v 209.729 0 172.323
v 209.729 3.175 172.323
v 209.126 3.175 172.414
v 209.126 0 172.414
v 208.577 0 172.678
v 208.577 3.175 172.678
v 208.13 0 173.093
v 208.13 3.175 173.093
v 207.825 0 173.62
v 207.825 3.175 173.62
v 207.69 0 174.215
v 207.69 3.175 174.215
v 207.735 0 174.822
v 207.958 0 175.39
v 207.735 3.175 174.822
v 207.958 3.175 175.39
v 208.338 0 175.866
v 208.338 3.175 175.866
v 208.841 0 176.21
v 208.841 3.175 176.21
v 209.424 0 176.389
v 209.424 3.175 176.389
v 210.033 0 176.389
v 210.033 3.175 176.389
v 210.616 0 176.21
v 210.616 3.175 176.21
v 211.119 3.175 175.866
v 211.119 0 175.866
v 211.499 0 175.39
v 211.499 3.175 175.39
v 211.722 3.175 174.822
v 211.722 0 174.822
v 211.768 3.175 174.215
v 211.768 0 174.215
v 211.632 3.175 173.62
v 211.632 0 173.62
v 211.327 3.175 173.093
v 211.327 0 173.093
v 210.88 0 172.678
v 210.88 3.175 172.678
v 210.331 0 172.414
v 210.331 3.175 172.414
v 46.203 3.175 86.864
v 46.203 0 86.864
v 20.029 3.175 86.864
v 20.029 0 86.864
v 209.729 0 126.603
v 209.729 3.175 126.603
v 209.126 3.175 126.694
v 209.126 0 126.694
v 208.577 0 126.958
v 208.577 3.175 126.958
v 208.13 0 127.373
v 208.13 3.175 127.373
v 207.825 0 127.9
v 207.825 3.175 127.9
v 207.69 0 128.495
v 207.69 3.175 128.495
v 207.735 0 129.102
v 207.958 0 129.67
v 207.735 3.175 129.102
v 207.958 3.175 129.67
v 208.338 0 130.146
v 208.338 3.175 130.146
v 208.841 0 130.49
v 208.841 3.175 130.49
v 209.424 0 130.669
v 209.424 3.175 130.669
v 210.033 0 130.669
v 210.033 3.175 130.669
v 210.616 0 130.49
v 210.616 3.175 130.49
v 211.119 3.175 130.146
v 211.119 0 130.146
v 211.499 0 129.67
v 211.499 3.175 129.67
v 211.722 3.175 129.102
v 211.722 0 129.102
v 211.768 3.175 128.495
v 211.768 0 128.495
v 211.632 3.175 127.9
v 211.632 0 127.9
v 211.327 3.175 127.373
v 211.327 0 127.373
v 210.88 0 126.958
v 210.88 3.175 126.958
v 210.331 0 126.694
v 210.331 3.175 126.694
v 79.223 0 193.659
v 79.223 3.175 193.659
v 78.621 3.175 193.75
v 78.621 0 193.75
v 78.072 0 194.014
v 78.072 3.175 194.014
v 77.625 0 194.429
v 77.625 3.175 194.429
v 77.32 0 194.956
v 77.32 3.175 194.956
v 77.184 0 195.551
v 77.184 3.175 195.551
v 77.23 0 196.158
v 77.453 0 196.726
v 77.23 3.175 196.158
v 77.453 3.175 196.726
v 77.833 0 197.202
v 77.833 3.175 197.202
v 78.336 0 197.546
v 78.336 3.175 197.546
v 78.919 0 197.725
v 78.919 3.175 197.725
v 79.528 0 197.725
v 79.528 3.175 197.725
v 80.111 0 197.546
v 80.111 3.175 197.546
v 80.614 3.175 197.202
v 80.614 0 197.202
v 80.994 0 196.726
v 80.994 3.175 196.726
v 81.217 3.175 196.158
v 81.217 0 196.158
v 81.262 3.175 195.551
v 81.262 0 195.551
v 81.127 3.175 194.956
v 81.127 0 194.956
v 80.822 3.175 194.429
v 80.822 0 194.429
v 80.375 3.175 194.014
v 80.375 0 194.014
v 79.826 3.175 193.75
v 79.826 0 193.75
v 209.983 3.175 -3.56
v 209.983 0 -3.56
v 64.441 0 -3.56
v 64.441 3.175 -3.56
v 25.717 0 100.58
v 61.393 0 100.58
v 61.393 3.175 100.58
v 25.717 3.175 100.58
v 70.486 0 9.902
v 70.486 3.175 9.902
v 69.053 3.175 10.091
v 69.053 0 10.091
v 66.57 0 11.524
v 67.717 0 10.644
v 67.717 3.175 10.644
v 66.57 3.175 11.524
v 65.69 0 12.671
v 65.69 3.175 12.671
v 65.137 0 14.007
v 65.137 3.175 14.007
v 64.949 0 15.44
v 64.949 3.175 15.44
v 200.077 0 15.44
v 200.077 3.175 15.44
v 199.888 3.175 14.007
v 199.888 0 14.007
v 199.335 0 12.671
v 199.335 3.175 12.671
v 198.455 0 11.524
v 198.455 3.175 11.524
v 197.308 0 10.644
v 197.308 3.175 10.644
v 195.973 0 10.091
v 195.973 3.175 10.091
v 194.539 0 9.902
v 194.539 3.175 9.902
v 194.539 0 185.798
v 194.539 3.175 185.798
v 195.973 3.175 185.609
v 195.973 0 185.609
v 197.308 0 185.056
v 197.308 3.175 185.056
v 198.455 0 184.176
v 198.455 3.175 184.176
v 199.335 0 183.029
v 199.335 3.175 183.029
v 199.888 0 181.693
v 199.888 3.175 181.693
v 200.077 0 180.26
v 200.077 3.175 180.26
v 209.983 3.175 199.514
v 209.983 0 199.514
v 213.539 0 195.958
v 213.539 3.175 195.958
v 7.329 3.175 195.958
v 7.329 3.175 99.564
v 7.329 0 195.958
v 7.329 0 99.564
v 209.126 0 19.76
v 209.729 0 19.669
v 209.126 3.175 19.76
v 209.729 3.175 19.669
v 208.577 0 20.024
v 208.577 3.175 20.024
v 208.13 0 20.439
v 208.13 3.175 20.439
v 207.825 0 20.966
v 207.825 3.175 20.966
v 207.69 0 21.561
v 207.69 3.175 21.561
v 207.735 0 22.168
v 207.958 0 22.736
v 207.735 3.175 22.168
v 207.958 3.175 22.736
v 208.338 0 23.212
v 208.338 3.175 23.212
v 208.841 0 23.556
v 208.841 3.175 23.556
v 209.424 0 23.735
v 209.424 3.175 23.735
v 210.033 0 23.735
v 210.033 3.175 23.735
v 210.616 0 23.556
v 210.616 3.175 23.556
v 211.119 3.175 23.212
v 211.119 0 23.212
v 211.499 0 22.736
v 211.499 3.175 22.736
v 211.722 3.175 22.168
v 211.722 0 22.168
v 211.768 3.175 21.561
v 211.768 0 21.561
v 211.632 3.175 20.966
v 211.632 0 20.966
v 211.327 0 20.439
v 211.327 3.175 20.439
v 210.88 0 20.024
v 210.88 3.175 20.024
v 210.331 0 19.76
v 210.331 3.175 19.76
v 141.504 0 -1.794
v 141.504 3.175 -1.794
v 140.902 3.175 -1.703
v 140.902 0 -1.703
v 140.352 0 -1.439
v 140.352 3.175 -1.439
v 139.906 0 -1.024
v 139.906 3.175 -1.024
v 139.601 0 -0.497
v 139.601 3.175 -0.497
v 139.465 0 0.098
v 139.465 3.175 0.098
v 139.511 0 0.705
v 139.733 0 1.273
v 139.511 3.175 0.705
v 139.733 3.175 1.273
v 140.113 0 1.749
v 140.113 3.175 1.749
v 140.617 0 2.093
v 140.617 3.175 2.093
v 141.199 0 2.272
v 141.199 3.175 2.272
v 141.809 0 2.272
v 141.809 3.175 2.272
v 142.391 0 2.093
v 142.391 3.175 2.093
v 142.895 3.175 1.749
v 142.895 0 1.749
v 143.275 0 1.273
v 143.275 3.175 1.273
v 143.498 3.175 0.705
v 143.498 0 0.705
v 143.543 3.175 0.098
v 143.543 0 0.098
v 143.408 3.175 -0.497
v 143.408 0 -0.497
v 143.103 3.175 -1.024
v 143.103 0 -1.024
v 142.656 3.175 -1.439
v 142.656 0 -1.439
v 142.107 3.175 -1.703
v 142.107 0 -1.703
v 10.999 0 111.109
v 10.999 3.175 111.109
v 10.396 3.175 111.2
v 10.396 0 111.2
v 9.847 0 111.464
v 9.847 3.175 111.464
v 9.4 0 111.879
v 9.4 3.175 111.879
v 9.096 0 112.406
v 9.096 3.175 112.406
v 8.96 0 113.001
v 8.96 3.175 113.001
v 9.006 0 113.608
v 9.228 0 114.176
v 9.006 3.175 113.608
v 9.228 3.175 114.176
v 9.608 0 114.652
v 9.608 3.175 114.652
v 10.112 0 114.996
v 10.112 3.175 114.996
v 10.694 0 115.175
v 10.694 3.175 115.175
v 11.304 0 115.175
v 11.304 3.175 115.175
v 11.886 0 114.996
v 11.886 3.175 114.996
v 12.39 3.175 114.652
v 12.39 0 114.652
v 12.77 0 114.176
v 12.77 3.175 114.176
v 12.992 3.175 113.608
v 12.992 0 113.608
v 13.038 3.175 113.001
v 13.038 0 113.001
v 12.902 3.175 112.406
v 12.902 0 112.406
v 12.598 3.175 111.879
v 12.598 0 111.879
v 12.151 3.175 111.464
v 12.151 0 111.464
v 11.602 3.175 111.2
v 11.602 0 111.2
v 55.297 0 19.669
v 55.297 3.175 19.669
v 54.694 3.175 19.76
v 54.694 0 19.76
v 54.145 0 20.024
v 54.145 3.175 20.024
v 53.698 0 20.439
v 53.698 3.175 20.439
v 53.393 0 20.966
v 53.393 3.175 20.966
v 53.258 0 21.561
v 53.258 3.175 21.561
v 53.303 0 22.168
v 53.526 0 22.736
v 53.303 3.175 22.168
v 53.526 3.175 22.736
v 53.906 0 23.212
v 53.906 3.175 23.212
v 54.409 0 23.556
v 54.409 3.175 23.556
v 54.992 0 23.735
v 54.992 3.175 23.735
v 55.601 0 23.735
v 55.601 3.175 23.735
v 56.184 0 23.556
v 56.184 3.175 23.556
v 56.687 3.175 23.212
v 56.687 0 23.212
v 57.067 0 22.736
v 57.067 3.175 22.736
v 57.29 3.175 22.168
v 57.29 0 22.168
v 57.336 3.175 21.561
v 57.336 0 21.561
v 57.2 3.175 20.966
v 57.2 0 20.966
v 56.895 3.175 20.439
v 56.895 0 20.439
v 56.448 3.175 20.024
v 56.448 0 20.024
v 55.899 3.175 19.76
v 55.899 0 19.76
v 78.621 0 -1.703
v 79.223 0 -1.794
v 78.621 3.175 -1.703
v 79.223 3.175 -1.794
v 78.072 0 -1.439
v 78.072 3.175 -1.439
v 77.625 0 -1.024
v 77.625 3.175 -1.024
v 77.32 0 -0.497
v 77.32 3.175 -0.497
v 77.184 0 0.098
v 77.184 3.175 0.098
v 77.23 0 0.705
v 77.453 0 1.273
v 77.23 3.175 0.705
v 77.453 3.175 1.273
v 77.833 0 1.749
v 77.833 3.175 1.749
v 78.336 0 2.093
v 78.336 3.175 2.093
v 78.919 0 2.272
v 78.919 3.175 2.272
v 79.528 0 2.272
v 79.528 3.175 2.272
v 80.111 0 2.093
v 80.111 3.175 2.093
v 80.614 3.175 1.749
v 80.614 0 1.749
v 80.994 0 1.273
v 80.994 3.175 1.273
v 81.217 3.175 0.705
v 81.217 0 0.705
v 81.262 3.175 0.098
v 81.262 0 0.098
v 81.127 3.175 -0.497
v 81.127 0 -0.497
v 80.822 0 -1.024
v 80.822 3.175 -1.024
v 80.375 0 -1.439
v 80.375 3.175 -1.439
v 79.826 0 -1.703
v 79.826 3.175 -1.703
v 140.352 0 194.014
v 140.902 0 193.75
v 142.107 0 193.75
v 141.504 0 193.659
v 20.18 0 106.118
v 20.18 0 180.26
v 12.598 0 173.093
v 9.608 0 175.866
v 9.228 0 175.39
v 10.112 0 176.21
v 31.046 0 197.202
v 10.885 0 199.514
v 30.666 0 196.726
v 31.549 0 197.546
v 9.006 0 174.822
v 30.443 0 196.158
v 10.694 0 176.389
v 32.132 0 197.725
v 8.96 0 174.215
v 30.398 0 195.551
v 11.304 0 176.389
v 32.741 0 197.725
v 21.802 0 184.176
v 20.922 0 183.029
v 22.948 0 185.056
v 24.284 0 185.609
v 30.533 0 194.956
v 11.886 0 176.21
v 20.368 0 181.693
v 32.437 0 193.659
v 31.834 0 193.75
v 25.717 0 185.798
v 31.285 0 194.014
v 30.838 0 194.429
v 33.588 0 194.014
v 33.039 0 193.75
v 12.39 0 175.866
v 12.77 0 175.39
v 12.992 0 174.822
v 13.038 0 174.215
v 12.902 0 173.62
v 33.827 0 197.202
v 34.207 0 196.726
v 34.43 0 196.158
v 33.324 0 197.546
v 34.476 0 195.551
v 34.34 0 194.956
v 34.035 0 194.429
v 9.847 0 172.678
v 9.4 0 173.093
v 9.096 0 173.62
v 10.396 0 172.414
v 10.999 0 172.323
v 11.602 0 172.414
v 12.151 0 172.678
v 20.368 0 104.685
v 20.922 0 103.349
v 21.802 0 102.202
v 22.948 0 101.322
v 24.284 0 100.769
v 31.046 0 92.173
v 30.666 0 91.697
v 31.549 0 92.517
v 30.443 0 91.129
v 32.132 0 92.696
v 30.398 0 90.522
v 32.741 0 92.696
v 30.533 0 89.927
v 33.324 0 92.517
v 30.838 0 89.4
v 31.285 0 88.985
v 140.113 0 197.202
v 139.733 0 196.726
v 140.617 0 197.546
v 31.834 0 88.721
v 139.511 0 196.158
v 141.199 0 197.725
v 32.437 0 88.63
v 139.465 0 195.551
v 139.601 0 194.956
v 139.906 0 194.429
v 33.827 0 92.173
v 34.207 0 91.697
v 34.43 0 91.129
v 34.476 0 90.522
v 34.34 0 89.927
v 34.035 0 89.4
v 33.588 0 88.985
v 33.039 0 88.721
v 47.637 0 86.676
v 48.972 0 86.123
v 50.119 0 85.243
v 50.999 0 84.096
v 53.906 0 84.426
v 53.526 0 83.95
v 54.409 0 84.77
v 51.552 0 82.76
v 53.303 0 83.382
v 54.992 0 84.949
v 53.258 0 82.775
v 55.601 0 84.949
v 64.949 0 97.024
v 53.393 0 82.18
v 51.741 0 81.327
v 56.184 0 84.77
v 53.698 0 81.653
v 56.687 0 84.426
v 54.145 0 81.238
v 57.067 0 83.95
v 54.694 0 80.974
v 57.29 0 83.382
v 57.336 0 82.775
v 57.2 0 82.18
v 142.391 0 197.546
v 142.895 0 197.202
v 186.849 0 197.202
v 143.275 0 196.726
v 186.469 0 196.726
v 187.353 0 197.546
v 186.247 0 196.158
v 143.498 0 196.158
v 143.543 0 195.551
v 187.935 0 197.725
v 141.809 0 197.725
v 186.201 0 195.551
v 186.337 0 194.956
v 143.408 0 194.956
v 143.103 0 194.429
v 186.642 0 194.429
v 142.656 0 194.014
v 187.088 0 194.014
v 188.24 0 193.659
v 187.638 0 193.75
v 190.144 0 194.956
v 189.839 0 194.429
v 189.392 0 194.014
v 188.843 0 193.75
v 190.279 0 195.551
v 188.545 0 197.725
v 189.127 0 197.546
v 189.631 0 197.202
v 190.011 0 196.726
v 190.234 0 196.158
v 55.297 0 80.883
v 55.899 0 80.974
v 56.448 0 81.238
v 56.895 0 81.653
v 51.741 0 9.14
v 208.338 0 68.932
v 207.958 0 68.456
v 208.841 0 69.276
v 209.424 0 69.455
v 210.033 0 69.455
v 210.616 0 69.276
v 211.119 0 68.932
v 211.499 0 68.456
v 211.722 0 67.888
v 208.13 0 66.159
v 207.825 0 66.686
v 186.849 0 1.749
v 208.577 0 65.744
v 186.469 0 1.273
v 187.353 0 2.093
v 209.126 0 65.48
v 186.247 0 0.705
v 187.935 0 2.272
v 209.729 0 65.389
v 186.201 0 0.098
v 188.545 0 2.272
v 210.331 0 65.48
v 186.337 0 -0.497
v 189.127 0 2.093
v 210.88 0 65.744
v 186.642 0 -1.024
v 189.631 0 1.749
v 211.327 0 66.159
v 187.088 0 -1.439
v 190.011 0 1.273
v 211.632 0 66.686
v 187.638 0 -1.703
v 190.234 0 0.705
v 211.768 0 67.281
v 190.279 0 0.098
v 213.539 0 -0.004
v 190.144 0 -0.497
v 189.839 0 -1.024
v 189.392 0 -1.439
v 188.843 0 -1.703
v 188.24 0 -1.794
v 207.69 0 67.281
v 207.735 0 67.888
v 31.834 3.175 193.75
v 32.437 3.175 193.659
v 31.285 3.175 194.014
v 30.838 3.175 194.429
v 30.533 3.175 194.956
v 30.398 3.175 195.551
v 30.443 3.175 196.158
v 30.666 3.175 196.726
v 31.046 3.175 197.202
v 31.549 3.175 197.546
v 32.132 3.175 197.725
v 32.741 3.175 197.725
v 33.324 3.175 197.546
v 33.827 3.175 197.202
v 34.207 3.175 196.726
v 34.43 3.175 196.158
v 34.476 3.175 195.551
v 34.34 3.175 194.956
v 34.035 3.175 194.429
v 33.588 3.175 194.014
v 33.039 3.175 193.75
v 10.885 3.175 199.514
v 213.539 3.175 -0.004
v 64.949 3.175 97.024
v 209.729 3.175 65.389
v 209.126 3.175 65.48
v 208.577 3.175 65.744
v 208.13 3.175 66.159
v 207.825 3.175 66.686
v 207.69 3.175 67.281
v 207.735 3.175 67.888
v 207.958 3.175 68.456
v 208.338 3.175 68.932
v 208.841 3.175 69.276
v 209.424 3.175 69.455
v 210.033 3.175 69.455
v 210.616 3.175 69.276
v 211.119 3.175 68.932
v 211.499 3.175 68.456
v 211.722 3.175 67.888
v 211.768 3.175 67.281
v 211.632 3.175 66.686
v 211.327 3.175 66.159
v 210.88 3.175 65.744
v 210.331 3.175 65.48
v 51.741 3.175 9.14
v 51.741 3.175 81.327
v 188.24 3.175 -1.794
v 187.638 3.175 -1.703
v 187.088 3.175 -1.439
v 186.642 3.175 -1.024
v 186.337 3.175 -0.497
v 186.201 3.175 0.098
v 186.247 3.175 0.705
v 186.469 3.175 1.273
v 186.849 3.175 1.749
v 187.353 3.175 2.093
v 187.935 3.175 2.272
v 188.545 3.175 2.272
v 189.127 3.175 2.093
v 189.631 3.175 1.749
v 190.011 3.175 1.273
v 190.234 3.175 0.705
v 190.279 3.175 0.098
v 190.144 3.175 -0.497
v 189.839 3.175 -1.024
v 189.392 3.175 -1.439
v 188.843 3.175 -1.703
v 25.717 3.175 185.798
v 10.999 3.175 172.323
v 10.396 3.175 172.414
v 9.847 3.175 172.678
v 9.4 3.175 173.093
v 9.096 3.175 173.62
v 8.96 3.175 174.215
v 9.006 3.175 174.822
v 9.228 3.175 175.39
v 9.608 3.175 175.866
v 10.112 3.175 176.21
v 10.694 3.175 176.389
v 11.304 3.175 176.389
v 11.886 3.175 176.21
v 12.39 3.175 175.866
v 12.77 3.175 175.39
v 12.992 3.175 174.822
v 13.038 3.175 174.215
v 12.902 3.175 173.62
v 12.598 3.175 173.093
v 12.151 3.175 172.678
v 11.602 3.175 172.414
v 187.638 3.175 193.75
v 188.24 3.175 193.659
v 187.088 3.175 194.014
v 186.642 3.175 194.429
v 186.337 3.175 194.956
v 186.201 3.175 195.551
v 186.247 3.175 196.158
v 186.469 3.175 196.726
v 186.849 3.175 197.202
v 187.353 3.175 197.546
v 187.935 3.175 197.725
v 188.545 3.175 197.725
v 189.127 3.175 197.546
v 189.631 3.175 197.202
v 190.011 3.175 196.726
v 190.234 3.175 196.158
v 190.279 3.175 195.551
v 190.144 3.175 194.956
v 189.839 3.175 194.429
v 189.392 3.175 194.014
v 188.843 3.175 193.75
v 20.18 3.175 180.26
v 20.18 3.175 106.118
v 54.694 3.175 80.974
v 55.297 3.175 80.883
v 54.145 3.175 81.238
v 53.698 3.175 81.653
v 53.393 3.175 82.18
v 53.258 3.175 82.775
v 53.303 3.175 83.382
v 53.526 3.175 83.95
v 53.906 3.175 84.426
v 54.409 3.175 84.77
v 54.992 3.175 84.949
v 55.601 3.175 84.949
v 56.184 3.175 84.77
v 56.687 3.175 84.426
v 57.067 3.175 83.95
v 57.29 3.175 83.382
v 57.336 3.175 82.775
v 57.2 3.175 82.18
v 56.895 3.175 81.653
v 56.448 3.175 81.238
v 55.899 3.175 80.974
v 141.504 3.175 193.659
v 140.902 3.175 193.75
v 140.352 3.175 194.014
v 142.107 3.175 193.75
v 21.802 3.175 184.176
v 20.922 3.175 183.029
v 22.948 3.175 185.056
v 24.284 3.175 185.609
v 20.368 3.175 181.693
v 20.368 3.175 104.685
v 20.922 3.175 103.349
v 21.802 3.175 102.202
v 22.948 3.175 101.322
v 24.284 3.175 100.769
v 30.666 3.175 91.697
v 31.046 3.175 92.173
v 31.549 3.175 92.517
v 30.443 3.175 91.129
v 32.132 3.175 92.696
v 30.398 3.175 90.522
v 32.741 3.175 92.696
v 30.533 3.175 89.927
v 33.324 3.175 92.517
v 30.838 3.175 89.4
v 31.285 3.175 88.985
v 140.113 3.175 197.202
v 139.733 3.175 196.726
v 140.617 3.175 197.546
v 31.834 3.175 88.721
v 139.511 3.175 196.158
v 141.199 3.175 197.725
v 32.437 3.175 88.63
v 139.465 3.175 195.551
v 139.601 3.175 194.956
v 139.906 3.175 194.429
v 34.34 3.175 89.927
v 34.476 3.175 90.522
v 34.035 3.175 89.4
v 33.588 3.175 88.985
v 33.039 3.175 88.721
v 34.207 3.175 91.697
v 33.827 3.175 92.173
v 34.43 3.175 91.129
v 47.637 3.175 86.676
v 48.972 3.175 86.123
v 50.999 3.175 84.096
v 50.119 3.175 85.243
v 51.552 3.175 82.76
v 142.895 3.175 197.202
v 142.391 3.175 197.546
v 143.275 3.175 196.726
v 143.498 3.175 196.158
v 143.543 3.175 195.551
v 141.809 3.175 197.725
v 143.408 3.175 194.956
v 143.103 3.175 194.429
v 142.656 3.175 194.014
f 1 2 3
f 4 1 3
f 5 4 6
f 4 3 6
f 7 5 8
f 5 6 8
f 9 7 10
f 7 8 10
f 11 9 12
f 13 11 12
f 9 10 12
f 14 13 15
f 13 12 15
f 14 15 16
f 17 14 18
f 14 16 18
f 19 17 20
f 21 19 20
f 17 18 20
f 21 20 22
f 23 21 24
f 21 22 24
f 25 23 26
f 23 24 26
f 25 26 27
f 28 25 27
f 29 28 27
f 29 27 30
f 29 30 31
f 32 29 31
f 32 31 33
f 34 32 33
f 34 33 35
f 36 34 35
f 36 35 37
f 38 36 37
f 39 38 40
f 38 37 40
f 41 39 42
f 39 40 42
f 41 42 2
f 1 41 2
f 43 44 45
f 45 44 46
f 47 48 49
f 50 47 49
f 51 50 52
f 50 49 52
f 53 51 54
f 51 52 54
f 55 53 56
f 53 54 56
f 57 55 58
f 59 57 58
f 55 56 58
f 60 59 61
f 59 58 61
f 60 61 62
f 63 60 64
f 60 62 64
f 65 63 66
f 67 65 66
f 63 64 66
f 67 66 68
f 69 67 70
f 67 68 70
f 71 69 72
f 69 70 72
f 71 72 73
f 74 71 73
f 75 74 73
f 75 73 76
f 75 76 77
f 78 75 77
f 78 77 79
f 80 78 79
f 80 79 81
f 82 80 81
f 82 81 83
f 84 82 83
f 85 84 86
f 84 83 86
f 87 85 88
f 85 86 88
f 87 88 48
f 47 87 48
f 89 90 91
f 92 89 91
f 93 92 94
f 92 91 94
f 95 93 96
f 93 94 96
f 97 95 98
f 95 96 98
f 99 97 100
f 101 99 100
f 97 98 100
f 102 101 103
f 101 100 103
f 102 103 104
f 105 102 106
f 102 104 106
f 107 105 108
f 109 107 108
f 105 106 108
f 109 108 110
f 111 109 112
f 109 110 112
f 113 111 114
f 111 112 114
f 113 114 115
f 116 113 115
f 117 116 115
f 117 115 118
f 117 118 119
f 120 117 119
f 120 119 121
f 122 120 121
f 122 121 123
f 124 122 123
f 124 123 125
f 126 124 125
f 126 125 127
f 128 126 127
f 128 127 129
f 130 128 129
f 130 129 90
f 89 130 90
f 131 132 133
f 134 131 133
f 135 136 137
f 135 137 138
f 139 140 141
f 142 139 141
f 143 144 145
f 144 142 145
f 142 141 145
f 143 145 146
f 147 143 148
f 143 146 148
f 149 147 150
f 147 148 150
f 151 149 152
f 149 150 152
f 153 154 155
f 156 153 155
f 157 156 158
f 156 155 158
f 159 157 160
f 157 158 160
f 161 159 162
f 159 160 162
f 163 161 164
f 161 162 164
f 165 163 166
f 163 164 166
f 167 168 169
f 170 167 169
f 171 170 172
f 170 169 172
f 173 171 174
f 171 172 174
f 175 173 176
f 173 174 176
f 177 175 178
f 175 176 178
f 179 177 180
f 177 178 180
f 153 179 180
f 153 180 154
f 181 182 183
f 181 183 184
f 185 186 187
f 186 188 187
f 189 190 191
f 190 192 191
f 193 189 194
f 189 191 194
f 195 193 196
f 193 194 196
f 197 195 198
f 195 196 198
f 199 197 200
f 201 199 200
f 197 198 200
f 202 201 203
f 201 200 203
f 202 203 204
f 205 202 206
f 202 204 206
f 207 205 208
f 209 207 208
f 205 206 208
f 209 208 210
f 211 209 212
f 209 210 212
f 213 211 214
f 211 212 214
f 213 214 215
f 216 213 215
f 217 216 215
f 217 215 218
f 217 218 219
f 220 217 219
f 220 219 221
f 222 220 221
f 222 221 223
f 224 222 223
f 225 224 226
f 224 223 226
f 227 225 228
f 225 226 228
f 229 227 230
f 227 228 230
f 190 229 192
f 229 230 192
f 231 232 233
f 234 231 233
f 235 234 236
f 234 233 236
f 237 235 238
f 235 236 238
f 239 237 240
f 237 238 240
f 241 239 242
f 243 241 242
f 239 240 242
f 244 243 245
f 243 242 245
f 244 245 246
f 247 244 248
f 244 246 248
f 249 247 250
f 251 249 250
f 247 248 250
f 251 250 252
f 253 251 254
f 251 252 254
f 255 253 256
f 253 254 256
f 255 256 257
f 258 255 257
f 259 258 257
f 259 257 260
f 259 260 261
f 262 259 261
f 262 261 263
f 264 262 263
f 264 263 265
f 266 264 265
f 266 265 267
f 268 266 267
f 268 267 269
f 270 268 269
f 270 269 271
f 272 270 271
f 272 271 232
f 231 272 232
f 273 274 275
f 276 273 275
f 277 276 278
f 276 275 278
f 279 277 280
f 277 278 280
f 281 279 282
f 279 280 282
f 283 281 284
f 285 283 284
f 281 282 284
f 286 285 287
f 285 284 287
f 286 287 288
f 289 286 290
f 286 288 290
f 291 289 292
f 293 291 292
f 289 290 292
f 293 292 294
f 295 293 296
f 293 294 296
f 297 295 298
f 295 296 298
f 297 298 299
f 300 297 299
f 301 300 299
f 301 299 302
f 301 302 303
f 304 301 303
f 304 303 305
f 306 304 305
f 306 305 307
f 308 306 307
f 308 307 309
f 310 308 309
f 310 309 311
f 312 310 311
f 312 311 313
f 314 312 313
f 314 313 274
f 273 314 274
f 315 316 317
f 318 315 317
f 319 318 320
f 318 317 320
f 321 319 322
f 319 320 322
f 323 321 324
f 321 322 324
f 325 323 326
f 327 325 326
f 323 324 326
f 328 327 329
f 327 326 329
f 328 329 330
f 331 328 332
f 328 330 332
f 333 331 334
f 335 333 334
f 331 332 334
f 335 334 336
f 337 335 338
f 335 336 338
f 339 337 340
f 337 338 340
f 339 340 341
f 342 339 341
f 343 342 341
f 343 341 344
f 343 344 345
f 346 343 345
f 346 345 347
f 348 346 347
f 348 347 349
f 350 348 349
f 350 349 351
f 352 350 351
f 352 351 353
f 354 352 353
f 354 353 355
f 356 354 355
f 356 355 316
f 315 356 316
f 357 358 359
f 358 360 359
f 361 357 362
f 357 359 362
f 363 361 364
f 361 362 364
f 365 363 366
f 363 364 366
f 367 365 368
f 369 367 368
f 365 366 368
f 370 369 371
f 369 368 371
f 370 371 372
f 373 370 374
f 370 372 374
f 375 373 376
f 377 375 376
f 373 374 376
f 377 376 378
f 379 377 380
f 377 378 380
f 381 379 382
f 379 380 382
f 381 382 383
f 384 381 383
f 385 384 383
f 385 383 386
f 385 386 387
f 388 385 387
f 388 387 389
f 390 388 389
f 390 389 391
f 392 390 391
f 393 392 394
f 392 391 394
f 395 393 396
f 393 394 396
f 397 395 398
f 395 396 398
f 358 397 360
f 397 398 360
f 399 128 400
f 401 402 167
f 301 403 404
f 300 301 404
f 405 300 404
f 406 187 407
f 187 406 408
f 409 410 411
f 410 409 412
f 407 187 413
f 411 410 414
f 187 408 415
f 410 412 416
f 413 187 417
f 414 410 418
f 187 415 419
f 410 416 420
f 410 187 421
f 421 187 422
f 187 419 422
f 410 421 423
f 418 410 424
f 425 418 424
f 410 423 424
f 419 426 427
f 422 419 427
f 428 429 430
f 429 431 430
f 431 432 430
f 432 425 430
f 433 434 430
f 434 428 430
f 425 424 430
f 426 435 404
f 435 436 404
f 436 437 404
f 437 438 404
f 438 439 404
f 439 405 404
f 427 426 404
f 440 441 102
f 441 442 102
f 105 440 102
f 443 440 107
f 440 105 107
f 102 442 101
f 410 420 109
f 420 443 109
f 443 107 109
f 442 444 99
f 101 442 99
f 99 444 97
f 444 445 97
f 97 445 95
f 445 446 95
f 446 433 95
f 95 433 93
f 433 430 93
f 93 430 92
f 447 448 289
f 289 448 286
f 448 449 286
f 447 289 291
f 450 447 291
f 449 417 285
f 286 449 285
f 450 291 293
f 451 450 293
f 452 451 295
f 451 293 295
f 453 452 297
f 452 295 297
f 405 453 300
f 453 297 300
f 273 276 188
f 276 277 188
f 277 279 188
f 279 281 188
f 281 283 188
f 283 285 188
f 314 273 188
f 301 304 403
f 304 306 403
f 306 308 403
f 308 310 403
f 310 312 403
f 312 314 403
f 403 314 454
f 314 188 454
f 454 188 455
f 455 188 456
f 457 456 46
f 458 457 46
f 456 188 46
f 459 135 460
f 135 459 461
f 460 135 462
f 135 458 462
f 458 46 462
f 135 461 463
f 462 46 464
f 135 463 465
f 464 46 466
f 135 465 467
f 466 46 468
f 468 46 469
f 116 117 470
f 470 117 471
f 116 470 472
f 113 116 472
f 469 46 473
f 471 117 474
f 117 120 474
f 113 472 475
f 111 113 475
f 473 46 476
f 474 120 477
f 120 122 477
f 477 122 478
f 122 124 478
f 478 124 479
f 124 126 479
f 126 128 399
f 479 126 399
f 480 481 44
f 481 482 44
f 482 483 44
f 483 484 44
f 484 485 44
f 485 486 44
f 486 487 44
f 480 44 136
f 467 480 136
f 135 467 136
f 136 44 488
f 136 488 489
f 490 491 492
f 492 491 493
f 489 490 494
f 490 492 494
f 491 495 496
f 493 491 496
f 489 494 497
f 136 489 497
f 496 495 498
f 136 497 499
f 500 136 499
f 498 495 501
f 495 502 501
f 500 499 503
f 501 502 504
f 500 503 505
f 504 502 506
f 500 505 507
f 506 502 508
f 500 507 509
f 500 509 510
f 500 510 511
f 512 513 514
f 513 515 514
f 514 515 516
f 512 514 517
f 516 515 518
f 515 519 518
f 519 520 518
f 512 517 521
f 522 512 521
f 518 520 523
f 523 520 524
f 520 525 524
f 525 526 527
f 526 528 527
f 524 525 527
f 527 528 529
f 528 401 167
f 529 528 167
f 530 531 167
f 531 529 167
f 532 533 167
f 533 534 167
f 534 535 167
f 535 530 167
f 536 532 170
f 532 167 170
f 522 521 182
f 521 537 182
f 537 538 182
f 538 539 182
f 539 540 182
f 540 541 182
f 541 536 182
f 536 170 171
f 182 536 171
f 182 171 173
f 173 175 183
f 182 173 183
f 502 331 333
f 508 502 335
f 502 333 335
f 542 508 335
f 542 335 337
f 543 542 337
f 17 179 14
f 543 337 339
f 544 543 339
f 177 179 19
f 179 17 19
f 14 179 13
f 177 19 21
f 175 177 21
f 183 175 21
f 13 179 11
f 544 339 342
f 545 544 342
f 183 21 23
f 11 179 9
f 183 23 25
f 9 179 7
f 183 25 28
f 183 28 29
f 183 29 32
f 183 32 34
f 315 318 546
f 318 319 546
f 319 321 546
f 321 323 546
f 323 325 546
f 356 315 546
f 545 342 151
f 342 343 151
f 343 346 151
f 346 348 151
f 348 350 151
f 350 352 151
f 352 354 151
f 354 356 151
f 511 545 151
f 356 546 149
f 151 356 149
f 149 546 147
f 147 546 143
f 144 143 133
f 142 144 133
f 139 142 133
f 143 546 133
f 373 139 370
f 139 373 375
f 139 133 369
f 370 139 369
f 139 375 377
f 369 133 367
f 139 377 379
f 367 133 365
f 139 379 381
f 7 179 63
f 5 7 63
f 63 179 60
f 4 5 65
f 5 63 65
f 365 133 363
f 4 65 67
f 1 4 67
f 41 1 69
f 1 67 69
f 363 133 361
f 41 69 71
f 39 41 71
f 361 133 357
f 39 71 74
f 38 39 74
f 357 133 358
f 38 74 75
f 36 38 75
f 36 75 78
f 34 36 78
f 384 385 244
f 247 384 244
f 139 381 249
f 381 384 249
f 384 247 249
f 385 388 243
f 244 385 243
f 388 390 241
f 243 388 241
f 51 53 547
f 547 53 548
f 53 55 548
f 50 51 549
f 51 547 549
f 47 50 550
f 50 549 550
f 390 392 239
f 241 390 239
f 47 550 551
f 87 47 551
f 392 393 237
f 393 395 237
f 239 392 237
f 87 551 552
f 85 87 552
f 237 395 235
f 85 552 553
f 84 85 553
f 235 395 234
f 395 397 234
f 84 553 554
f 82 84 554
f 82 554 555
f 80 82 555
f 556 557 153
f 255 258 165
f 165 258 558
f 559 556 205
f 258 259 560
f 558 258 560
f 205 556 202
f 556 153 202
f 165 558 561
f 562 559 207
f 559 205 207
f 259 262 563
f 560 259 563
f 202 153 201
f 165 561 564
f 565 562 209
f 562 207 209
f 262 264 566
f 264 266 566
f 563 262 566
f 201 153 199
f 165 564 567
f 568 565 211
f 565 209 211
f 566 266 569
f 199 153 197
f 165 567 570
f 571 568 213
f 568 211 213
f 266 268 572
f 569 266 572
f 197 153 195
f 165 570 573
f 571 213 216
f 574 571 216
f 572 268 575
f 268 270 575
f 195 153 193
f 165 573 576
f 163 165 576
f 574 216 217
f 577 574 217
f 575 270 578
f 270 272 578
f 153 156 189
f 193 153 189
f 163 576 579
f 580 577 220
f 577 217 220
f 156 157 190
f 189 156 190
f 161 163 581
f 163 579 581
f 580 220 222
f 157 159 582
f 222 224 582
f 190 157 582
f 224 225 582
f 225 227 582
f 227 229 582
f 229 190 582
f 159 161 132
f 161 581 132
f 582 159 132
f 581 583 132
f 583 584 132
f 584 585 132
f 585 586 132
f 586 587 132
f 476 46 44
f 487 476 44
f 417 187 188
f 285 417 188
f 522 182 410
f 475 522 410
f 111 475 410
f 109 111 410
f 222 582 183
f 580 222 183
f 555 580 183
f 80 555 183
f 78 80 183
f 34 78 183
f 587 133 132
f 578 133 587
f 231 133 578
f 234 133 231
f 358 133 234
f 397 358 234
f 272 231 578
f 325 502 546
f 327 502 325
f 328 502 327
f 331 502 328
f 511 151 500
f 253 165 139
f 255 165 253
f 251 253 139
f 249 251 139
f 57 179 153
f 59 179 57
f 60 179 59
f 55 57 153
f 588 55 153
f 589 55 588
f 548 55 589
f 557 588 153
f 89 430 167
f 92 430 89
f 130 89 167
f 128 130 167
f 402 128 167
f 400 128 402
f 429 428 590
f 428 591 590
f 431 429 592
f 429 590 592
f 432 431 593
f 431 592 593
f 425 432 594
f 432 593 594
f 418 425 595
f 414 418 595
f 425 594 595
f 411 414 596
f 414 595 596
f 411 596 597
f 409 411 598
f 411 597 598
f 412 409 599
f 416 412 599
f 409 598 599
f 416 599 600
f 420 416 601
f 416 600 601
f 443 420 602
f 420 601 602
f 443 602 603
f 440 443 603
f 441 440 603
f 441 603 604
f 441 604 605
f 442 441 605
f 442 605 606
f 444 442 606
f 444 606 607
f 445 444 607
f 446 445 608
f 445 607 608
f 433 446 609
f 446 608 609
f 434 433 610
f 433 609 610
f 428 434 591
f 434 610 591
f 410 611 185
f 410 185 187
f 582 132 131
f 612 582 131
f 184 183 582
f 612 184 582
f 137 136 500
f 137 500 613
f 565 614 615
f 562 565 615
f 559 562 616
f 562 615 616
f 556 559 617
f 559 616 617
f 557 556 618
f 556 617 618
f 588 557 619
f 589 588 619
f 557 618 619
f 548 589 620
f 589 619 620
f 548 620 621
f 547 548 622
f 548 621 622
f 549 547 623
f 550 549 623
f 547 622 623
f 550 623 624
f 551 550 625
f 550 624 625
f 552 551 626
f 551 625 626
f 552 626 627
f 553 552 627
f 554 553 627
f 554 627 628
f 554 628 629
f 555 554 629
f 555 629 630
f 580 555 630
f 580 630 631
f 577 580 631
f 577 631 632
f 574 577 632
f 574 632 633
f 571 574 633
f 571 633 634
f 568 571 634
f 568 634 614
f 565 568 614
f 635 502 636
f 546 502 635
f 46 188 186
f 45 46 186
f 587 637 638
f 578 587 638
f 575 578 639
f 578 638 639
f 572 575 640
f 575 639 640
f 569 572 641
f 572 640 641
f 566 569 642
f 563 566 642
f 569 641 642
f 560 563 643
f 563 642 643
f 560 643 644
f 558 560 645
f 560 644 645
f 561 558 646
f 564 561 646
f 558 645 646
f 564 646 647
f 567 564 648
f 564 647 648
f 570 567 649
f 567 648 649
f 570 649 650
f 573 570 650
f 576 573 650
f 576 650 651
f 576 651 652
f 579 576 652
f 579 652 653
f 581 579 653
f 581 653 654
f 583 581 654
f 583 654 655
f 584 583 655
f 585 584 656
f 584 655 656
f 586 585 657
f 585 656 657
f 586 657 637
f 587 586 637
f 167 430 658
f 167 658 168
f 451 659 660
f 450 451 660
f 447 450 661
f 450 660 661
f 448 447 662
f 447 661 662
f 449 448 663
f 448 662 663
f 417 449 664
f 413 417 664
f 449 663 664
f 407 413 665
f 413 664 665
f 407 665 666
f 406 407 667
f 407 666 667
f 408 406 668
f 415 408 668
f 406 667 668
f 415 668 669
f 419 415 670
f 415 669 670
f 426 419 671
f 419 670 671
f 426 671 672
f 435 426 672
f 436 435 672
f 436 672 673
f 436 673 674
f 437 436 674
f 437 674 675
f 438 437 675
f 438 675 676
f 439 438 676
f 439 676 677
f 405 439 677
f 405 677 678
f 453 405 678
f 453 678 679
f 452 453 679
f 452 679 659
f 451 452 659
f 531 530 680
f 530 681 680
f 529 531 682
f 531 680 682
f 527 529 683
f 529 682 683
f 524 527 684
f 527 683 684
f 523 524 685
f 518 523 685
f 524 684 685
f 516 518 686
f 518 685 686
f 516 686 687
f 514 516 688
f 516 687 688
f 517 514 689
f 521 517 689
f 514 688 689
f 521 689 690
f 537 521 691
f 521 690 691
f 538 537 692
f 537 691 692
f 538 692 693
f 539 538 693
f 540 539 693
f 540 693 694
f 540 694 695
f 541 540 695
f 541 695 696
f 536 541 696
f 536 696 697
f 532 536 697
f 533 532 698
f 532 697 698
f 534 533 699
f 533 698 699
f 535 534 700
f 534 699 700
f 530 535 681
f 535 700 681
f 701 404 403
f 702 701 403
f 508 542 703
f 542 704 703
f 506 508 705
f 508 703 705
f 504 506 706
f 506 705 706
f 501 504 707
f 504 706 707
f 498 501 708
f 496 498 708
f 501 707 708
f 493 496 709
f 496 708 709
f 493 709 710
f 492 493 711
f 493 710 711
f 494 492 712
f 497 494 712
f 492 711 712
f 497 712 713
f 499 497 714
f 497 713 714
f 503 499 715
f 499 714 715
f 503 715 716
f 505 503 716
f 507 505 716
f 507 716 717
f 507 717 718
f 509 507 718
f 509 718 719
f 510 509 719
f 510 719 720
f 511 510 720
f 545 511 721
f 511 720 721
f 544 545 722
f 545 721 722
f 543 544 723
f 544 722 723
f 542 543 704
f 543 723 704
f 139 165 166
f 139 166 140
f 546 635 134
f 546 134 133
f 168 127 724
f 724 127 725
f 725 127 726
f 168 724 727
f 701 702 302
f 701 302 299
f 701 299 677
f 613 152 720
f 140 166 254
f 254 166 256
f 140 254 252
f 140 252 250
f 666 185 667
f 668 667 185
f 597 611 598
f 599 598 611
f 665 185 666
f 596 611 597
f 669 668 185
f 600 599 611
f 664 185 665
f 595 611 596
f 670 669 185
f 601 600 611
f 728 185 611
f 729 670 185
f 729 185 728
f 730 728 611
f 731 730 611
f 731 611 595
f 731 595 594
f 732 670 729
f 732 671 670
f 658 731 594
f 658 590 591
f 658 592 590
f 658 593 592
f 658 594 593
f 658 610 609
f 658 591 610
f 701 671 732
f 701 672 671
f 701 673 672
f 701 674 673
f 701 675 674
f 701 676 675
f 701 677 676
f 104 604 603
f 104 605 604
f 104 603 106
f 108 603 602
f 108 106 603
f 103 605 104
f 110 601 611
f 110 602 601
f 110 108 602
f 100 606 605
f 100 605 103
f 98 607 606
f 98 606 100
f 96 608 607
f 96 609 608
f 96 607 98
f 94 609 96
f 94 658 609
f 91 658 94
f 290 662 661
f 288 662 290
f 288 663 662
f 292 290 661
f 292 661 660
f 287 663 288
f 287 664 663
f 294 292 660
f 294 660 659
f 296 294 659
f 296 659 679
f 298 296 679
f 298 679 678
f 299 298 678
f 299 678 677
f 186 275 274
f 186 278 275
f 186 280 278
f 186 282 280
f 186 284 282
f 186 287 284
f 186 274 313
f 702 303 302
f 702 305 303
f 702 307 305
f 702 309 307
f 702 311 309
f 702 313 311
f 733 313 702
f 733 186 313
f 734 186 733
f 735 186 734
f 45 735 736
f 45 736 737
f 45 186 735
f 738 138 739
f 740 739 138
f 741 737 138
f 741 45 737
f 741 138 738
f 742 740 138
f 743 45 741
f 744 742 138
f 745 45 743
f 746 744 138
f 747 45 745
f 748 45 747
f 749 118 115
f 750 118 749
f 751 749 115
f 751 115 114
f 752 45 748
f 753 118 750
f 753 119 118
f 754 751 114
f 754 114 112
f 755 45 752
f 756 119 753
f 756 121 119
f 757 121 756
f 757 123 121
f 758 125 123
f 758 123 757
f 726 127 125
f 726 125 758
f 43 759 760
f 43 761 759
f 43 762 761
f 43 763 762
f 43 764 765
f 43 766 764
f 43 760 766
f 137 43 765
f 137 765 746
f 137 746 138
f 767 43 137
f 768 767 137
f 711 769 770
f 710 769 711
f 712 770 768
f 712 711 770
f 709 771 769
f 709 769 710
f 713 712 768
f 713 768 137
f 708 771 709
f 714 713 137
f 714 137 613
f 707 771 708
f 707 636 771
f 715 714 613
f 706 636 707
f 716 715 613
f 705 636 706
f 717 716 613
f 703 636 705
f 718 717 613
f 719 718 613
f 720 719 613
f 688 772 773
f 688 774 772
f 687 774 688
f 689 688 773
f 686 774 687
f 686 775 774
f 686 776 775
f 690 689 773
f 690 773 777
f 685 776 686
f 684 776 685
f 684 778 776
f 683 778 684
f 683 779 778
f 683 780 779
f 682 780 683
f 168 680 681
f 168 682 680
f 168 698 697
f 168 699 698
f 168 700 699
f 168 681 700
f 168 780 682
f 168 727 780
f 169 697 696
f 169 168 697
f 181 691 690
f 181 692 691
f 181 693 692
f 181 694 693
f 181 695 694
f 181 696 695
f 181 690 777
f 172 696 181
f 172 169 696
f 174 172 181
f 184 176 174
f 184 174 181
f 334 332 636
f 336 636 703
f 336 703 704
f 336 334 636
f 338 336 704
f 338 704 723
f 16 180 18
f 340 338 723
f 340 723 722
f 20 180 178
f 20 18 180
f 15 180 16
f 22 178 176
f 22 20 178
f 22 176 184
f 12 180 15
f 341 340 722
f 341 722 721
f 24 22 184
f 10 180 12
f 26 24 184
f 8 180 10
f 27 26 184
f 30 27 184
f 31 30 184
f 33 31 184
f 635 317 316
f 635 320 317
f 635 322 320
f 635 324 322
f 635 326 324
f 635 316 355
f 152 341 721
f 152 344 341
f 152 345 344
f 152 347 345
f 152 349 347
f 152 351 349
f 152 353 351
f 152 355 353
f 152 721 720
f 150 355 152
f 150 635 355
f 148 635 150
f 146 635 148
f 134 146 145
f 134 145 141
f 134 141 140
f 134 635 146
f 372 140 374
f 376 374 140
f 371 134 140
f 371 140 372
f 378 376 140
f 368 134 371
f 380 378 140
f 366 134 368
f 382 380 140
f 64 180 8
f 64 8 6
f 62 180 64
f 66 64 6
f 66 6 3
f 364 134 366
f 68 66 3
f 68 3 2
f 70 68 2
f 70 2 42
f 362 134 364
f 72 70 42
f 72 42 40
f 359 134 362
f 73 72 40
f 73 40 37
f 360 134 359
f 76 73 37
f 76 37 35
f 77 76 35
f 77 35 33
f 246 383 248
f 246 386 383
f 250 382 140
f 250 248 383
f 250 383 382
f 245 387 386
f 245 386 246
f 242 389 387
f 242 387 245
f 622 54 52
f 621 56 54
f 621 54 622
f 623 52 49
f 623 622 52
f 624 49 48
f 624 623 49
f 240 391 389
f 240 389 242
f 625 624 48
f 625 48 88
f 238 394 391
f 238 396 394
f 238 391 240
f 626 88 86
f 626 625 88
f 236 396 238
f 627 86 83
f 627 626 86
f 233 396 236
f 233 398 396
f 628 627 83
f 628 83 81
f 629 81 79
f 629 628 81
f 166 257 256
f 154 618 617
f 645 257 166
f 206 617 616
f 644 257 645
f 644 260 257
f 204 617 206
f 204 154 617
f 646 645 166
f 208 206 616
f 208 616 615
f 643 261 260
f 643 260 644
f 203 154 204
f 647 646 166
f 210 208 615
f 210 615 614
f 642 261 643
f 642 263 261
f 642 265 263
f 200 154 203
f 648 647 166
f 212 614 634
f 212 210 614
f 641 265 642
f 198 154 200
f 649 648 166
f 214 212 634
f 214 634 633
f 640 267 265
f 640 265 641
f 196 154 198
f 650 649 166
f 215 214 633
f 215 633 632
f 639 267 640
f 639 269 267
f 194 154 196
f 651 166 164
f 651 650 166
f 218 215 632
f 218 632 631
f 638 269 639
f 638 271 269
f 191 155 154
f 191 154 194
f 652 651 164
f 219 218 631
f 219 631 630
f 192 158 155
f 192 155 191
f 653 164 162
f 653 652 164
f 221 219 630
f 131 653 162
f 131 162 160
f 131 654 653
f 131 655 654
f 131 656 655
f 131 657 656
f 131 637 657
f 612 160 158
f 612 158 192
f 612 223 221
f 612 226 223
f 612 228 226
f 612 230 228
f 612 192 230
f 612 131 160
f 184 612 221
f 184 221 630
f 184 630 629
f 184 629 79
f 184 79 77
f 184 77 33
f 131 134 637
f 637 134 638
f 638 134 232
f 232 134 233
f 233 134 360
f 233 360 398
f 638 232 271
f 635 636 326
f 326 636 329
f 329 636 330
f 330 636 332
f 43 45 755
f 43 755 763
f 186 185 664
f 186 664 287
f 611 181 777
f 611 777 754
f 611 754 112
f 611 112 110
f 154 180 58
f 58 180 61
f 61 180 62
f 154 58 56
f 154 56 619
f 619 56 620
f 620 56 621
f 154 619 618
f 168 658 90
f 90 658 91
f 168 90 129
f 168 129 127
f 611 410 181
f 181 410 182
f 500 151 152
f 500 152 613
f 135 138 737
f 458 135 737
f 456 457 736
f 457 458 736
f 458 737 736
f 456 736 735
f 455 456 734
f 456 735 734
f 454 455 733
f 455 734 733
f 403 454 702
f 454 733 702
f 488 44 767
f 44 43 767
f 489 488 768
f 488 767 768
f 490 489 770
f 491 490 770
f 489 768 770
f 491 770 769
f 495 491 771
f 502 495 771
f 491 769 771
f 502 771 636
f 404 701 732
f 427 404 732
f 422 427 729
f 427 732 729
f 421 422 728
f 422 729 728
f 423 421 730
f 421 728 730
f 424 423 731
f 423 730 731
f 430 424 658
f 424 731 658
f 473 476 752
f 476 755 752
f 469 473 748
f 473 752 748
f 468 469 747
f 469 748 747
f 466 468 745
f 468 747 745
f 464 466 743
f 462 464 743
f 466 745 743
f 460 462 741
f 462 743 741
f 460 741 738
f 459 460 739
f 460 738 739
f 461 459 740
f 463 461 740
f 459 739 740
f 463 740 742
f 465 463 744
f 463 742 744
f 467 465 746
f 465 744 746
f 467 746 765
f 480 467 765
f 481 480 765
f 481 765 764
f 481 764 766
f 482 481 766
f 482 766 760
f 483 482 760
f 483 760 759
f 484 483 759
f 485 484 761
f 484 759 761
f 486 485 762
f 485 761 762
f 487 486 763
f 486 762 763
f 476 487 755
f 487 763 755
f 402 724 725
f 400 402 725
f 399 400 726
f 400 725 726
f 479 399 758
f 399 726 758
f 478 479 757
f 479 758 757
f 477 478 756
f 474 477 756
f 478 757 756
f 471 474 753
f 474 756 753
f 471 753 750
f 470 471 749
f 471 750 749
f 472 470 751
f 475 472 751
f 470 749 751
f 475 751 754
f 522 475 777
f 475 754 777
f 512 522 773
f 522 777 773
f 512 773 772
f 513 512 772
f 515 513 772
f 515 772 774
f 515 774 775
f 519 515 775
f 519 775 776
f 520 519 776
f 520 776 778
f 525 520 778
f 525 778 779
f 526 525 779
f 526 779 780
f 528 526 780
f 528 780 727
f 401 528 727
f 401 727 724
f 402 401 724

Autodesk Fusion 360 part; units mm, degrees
sketch "Front" plane through (0, 0, 0) normal (0, 1, 0) x (1, 0, 0) in component "1006349"
  line L0 (-57.8768, -199.5135) -> (216.2733, -199.5135) construction
  line L1 (-57.6388, 3.5595) -> (225.0785, 3.5595) construction
  line L2 (7.3291, 79.7924) -> (7.3291, -206.2565) construction
  line L3 (213.5386, 80.0304) -> (213.5386, -202.9248) construction
  line L4 (-45.264, -185.7975) -> (221.5088, -185.7975) construction
  line L5 (-43.8142, -9.9025) -> (216.9872, -9.9025) construction
  line L6 (20.1798, 68.3695) -> (20.1798, -205.3046) construction
  line L7 (-33.6031, -100.5805) -> (90.6212, -100.5805) construction
  line L8 (-21.4662, -86.8645) -> (74.9147, -86.8645) construction
  line L9 (51.7406, 52.901) -> (51.7406, -104.1642) construction
  line L10 (64.9486, 43.6199) -> (64.9486, -104.4021) construction
  line L11 (61.3164, 31.245) -> (61.3164, -104.4021) construction
  line L12 (204.2676, 28.1453) -> (204.2676, -293.7347) construction
  line L13 (301.4692, -174.3675) -> (-2.19, -174.3675) construction
  line L14 (289.3324, -128.6475) -> (193.4275, -128.6475) construction
  line L15 (188.2402, -212.6819) -> (188.2402, 15.0626) construction
  line L16 (141.5042, -224.3428) -> (141.5042, 9.827) construction
  line L17 (79.2234, -236.9556) -> (79.2234, 11.9688) construction
  line L18 (32.4366, -262.9987) -> (32.4366, -64.0809) construction
  line L19 (55.2966, -250.3288) -> (55.2966, 19.8573) construction
  line L20 (276.3559, -113.1535) -> (-0.7101, -113.1535) construction
  line L21 (251.1435, -82.9275) -> (47.1227, -82.9275) construction
  line L22 (224.557, -21.7135) -> (42.5012, -21.7135) construction
  line L23 (328.6587, -0.2505) -> (74.127, -0.2505) construction
  line L24 (326.747, -5.7115) -> (-6.8013, -5.7115) construction
  line L25 (238.6648, -67.4335) -> (193.169, -67.4335) construction
  line L26 (209.7286, -275.7982) -> (209.7286, -12.1057) construction
  line L27 (313.957, -195.7035) -> (25.5151, -195.7035) construction
  line L28 (325.8246, -190.0139) -> (-1.5489, -190.0139) construction
  line L29 (263.2084, -90.6745) -> (24.7432, -90.6745) construction
  line L30 (10.999, -276.0365) -> (10.999, -104.4195) construction
  line L31 (16.7648, -288.1351) -> (16.7648, -78.75) construction
  line L32 (7.3291, -199.5135) -> (213.5386, -199.5135)
  line L33 (213.5386, 3.5595) -> (51.7406, 3.5595)
  line L34 (51.7406, -86.8645) -> (51.7406, 3.5595)
  line L35 (51.7406, -86.8645) -> (7.3291, -86.8645)
  line L36 (7.3291, -86.8645) -> (7.3291, -199.5135)
  line L37 (213.5386, -199.5135) -> (213.5386, 3.5595)
  line L38 (20.1798, -104.5315) -> (20.1798, -100.5805)
  line L39 (200.0766, -193.5194) -> (200.0766, 68.0398) construction
  line L40 (-6.7988, -96.9737) -> (70.6703, -96.9737) construction
  line L41 (20.1798, -185.7975) -> (200.0766, -185.7975)
  line L42 (200.0766, -185.7975) -> (200.0766, -5.7115)
  line L43 (64.9486, -5.7115) -> (64.9486, -100.5805)
  line L44 (64.9486, -100.5805) -> (20.1798, -100.5805)
  line L45 (20.1798, -100.5805) -> (20.1798, -185.7975)
  line L46 (200.0766, -9.9025) -> (64.9486, -9.9025)
  point P0 (10.999, -174.3675)
  point P1 (32.4366, -195.7035)
  point P2 (79.2234, -195.7035)
  point P3 (141.5042, -195.7035)
  point P4 (188.2402, -195.7035)
  point P5 (209.7286, -174.3675)
  point P6 (209.7286, -128.6475)
  point P7 (209.7286, -67.4335)
  point P8 (209.7286, -21.7135)
  point P9 (188.2402, -0.2505)
  point P10 (141.5042, -0.2505)
  point P11 (79.2234, -0.2505)
  point P12 (55.2966, -21.7135)
  point P13 (55.2966, -82.9275)
  point P14 (32.4366, -90.6745)
  point P15 (10.999, -113.1535)
  dimension "d1" = 203.073
  dimension "d2" = 174.117
  dimension "d3" = 128.397
  dimension "d4" = 90.424
  dimension "d5" = 82.677
  dimension "d6" = 67.183
  dimension "d7" = 21.463
  dimension "d8" = 195.453
  dimension "d9" = 90.424
  dimension "d10" = 13.462
  dimension "d14" = 198.7296
  dimension "d15" = 177.292
  dimension "d16" = 154.432
  dimension "d17" = 130.5052
  dimension "d18" = 68.2244
  dimension "d19" = 21.4884
  dimension "d20" = 161.798
  dimension "d22" = 142.9512
  dimension "d26" = 175.895
  dimension "d27" = 112.903
  dimension "d28" = 184.3024
  dimension "d31" = 5.461
  dimension "d32" = 13.716
  dimension "d33" = 187.5028
  dimension "d46" = 9.652
  dimension "d48" = 13.462
  dimension "d49" = 135.128
  dimension "d50" = 91.2622
  dimension "d51" = 5.461
extrude "Extrude2" add sketch "Front" along normal blind 3.175 in component "1006349"
chamfer "Chamfer3" distance 3.556 angle 45 4 edges at (213.5386, 1.5875, -3.5595) (64.9486, 1.5875, 100.5805) (7.3291, 1.5875, 199.5135) (213.5386, 1.5875, 199.5135) in component "1006349"
chamfer "Chamfer4" distance 12.7 angle 45 2 edges at (7.3291, 1.5875, 86.8645) (51.7406, 1.5875, -3.5595) in component "1006349"
fillet "Fillet2" radius 5.5372 6 edges at (20.1798, 1.5875, 185.7975) (20.1798, 1.5875, 100.5805) (64.9486, 1.5875, 9.9025) (200.0766, 1.5875, 9.9025) (200.0766, 1.5875, 185.7975) (51.7406, 1.5875, 86.8645) in component "1006349"
hole "Hole2" at (32.4366, 0, 195.7035) at (79.2234, 0, 195.7035) at (141.5042, 0, 195.7035) at (188.2402, 0, 195.7035) at (10.999, 0, 174.3675) at (10.999, 0, 113.1535) at (32.4366, 0, 90.6745) at (209.7286, 0, 174.3675) at (209.7286, 0, 128.6475) at (209.7286, 0, 67.4335) at (209.7286, 0, 21.7135) at (188.2402, 0, 0.2505) at (141.5042, 0, 0.2505) at (79.2234, 0, 0.2505) at (55.2966, 0, 21.7135) at (55.2966, 0, 82.9275) direction (0, 1, 0) diameter 4.0894 end through all in component "1006349"
component "1006349" placed x (1, 0, 0) y (0, 1, 0) z (0, 0, 1) at (0, 0, 0)
